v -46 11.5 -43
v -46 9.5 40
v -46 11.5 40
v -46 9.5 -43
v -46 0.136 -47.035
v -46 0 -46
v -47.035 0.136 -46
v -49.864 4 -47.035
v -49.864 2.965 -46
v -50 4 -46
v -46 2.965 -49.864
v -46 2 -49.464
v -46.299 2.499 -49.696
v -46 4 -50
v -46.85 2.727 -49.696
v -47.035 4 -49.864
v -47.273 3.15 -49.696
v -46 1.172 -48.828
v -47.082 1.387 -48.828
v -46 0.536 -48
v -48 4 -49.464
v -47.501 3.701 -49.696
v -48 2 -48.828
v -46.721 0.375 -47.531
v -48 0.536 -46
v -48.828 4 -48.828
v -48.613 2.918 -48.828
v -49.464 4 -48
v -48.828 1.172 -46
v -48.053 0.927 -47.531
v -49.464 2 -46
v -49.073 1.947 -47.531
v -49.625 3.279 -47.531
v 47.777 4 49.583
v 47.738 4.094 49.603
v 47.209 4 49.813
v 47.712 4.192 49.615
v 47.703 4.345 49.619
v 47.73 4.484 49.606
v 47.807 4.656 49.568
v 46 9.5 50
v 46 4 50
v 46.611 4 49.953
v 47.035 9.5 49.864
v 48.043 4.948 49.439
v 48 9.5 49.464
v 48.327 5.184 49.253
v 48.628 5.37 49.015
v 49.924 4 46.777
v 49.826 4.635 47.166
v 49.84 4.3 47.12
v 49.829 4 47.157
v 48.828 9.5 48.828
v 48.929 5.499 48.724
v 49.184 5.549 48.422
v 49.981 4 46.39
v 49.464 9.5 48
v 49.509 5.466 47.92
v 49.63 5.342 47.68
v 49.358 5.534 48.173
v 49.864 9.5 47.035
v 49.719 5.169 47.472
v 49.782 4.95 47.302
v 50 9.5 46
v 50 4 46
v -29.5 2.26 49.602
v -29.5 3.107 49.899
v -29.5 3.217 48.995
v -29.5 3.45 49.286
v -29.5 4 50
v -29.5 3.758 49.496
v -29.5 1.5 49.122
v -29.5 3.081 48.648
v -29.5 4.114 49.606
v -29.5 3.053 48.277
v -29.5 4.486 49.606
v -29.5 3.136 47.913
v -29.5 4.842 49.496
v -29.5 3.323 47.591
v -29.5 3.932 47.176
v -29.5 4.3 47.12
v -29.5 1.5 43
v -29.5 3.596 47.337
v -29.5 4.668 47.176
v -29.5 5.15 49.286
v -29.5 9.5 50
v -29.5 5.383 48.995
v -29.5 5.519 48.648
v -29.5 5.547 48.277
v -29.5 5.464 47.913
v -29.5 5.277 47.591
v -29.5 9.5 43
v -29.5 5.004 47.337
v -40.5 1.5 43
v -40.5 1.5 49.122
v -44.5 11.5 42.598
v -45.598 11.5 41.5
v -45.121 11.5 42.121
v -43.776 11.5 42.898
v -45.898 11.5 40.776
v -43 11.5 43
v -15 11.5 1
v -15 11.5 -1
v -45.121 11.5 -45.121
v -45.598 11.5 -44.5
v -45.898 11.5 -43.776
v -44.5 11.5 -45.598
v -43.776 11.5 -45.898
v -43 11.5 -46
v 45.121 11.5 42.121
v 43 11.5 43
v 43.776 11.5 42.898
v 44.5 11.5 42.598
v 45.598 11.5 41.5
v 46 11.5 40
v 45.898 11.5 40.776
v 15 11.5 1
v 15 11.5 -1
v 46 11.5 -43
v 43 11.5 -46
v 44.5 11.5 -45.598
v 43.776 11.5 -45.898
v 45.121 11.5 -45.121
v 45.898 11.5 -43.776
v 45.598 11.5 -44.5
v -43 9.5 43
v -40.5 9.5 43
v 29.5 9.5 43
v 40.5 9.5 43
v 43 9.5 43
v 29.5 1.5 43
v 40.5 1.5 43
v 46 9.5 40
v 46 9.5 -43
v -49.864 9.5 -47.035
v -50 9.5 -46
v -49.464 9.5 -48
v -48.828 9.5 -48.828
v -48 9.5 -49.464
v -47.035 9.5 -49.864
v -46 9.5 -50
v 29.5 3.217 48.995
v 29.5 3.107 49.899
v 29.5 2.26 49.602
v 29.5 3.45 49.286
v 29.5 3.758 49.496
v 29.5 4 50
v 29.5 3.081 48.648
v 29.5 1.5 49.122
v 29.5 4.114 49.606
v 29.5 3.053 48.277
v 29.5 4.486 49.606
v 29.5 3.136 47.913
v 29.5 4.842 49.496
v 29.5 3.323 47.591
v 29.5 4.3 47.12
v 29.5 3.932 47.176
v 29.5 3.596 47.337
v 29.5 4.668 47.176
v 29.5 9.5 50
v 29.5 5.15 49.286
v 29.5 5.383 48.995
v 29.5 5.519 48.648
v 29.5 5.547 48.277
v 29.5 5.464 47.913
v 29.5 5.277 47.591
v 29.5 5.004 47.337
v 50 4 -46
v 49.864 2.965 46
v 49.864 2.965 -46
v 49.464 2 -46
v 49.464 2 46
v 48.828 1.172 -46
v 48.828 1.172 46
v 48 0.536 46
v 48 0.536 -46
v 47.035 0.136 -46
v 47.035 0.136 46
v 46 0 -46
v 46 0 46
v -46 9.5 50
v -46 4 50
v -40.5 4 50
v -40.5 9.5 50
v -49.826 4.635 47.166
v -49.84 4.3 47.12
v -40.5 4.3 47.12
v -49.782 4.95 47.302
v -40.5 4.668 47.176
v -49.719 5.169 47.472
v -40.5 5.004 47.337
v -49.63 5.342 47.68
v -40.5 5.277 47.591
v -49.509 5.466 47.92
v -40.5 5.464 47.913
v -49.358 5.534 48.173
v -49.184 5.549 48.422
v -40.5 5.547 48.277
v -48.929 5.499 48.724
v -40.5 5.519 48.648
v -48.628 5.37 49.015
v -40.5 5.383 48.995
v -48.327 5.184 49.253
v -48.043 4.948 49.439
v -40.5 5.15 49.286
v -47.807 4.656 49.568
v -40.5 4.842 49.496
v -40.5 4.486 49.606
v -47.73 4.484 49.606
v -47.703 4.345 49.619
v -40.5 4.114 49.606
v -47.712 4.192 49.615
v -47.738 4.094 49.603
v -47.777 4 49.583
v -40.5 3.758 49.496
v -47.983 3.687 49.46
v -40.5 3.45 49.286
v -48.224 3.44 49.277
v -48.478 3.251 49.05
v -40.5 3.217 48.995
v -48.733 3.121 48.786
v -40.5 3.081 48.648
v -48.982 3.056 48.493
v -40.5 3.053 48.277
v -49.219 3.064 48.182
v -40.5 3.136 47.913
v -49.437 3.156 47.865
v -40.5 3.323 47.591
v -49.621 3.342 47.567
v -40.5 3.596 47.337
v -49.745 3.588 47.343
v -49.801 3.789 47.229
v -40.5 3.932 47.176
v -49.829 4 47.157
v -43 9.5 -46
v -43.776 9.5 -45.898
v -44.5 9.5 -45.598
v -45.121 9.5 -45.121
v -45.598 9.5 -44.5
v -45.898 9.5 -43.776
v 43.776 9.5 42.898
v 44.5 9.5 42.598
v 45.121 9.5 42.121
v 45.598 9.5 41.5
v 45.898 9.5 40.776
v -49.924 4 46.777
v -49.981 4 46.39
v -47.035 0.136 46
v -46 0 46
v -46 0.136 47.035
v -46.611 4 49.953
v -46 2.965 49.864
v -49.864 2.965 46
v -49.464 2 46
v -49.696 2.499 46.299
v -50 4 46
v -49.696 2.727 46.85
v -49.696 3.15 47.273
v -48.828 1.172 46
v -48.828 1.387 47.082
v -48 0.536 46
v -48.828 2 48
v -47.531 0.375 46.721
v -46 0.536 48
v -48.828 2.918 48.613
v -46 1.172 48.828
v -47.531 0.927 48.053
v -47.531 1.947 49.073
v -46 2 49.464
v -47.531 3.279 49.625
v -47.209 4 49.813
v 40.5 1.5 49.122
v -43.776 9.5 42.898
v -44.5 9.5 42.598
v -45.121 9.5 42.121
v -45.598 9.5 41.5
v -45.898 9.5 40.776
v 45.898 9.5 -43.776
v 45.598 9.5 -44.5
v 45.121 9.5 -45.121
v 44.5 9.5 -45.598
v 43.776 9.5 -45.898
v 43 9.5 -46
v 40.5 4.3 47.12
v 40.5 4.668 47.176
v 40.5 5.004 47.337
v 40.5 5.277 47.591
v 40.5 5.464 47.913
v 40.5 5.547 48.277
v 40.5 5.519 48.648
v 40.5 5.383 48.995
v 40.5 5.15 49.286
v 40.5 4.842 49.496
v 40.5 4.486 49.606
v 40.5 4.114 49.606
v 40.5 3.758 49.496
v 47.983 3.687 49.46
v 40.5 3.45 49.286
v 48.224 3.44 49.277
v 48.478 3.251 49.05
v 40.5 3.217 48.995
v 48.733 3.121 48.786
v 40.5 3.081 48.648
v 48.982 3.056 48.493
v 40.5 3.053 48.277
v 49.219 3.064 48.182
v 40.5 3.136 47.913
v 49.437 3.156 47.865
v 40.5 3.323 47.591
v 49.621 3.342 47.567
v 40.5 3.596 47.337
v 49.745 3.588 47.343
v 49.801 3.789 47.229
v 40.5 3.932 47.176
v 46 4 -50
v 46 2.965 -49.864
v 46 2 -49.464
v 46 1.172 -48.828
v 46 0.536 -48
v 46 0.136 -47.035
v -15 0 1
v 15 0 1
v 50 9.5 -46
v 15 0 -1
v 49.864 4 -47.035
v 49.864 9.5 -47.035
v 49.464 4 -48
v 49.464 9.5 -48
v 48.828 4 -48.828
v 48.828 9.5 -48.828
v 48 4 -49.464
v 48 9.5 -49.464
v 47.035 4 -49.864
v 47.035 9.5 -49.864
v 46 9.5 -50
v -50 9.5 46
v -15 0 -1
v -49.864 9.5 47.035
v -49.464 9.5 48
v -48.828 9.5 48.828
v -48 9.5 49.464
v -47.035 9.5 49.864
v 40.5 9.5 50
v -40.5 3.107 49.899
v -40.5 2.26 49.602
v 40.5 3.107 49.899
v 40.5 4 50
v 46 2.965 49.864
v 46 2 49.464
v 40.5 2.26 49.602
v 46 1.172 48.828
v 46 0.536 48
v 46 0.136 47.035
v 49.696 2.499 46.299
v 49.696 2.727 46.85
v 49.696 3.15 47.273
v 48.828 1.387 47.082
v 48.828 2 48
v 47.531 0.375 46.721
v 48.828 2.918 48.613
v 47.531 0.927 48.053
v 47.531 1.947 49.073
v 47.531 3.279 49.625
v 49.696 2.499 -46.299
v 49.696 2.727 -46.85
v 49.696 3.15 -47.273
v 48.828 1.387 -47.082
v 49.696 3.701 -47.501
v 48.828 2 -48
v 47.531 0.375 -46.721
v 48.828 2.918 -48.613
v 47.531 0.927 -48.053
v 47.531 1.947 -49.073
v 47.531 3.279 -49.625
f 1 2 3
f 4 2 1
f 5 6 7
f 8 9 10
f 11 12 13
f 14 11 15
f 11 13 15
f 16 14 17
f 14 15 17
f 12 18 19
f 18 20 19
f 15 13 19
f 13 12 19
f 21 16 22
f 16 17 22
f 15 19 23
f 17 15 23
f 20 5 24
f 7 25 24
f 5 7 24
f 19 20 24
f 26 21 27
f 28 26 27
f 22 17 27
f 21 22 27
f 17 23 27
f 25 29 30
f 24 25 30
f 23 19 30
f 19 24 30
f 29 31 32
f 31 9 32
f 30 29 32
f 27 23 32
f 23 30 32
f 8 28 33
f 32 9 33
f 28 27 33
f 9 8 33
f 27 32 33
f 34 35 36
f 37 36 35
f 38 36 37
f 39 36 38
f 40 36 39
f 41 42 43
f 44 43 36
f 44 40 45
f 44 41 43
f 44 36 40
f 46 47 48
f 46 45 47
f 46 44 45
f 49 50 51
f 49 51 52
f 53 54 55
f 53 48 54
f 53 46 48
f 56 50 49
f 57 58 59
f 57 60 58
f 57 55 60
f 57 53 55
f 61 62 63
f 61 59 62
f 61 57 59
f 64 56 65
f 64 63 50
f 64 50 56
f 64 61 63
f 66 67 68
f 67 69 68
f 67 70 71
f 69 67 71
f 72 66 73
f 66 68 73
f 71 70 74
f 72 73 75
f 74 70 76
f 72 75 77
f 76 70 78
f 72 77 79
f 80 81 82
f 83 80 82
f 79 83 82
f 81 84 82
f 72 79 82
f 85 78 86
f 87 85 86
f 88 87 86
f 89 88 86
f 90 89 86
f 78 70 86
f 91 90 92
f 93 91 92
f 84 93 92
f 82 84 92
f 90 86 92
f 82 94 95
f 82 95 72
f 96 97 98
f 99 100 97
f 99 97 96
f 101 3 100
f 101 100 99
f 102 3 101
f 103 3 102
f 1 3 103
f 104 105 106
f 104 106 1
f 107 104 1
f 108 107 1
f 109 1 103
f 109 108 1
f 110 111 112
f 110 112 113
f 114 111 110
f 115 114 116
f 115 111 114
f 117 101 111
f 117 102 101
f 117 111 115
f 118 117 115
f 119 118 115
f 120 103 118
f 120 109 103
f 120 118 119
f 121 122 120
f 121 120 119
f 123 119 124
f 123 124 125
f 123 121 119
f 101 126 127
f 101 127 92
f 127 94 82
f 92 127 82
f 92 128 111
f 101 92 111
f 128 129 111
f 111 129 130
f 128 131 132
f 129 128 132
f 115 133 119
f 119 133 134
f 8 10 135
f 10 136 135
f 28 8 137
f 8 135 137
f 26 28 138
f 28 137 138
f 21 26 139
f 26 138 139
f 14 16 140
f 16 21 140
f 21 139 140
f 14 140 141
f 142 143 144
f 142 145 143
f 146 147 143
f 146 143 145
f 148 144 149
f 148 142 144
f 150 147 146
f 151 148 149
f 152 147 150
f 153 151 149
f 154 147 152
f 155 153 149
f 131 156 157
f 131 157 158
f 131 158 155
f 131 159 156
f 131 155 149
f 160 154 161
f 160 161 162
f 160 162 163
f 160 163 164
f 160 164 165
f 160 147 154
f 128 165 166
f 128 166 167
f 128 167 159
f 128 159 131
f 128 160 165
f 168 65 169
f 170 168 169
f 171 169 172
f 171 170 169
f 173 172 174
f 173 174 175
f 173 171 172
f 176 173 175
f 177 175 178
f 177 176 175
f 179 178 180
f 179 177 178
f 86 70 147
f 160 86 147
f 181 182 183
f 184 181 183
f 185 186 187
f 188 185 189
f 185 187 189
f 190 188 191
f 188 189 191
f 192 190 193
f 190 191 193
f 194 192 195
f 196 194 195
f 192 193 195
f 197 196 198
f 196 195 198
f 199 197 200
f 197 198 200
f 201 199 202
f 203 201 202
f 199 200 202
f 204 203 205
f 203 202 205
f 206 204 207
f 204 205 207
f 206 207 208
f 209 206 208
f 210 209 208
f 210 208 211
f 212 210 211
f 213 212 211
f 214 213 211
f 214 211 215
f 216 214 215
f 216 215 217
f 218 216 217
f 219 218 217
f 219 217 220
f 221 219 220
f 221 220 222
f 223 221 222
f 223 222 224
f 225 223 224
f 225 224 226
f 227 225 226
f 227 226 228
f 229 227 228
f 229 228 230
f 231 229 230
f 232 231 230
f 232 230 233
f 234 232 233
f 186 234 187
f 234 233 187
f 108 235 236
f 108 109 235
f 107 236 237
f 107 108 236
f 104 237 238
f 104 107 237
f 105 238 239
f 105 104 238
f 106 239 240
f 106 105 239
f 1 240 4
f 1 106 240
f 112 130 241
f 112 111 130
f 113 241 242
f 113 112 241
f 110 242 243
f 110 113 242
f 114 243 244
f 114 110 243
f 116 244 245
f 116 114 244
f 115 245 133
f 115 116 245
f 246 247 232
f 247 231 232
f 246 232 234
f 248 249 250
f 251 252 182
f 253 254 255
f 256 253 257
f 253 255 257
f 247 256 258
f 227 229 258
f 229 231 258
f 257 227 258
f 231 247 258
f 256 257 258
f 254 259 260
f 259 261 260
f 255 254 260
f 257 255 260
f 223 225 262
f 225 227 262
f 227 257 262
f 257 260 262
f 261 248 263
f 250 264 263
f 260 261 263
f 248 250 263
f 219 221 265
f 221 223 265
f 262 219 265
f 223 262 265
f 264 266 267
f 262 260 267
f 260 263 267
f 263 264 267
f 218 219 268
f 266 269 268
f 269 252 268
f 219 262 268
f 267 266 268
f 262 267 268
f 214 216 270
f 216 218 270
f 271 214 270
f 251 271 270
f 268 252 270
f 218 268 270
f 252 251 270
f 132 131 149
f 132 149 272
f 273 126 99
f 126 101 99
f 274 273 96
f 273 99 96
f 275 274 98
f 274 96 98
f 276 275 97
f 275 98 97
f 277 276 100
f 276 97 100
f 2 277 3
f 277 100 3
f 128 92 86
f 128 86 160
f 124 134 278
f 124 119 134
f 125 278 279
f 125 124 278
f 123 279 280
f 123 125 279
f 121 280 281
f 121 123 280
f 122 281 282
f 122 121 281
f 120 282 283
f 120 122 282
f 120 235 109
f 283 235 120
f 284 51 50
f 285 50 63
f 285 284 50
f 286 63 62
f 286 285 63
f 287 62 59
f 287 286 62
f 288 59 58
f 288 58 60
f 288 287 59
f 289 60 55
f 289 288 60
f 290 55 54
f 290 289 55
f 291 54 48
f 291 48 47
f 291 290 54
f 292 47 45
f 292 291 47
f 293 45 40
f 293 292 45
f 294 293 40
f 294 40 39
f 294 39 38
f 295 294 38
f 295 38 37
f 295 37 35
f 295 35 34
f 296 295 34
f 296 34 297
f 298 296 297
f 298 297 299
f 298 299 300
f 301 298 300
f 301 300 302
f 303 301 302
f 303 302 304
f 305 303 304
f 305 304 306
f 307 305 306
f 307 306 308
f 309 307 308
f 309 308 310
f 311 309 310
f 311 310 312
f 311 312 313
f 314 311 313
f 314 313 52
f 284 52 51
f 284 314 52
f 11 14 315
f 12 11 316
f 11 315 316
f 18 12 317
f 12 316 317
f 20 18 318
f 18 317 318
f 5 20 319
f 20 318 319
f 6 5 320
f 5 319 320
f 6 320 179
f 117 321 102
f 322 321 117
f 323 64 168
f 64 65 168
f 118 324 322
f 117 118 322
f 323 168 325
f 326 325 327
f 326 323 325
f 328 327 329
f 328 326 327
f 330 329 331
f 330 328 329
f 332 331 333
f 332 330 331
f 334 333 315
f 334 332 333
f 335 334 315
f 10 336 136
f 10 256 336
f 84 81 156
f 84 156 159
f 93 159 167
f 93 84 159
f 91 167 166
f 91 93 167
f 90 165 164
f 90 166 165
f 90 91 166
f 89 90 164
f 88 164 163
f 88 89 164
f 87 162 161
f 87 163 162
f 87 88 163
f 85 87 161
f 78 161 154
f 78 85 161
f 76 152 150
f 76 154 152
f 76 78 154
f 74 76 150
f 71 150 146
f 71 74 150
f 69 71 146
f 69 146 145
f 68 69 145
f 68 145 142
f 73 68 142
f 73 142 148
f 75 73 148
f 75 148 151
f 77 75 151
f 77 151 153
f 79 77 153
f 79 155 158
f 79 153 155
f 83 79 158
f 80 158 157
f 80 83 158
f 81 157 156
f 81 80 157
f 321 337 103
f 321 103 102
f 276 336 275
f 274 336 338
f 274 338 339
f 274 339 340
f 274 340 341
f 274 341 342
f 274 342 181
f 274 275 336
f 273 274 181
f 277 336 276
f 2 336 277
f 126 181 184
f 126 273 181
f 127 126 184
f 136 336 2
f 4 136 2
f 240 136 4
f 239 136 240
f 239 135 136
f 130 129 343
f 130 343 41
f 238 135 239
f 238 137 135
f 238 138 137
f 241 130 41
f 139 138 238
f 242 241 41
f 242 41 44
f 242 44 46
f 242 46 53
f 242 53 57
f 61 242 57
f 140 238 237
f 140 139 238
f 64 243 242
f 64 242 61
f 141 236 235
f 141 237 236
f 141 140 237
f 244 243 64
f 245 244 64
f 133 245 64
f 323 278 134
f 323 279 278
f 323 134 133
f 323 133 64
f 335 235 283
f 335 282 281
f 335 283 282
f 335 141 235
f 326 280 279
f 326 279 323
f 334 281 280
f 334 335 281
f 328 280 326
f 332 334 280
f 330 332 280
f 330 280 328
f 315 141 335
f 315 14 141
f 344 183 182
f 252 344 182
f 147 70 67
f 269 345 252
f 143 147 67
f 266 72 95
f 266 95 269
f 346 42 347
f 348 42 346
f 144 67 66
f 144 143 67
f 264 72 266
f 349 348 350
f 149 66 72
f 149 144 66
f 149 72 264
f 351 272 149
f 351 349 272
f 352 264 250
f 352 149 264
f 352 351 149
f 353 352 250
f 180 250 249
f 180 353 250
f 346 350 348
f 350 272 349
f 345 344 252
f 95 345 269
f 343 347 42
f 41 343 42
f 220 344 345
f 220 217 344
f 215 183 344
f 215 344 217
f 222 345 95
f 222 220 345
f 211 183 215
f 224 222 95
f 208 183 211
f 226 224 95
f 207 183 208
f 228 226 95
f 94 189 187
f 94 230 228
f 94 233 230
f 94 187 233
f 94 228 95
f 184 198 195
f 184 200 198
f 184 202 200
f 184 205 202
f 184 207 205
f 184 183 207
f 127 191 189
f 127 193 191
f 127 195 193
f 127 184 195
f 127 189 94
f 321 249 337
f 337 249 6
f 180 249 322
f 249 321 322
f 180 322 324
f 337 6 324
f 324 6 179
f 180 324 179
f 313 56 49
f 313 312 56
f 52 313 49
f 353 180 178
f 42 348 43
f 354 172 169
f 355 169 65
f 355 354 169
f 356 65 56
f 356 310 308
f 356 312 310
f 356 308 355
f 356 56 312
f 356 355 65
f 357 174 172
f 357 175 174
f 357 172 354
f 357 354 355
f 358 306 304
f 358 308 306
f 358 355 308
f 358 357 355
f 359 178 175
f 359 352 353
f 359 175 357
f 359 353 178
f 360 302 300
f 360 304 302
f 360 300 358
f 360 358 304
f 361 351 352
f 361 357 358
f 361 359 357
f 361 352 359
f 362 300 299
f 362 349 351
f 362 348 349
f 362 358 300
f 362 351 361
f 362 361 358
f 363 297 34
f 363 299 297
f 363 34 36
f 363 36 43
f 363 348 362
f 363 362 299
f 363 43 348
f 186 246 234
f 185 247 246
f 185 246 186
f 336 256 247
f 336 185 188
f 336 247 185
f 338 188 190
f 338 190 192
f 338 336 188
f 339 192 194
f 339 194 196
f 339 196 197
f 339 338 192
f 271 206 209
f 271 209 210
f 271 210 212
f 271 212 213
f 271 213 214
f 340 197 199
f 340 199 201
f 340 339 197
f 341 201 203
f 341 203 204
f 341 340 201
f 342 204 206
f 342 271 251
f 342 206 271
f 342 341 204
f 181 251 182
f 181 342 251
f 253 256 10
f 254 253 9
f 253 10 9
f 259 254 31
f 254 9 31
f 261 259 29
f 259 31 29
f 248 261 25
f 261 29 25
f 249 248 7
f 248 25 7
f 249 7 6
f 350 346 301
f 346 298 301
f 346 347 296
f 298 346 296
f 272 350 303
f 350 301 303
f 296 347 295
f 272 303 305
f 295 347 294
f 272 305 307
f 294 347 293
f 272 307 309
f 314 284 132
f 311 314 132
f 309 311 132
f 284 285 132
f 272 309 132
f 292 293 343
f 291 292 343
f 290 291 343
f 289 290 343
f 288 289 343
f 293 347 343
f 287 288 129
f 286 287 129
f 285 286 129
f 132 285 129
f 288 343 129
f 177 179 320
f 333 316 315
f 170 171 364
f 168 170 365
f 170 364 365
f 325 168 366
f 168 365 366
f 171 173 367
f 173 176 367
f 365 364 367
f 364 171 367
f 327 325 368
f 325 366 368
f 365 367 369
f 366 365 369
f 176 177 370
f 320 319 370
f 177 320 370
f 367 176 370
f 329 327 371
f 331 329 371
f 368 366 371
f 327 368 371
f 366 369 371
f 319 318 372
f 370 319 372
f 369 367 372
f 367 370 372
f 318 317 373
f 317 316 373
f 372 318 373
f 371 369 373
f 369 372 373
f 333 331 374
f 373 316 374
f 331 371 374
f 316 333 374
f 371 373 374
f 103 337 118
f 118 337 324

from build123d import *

# Parameters (mm, degrees)
SKETCH_1_W               = 100
SKETCH_1_H               = 100
EXTRUDE_1_DEPTH          = 9.5
FILLET_1_R               = 4
SKETCH_3_W               = 92
SKETCH_3_H               = 89
EXTRUDE_2_DEPTH          = 2
FILLET_2_R               = 3
SKETCH_2_W               = 11
SKETCH_2_H               = 7
CUT_EXTRUDE_1_DEPTH      = 8
SKETCH_4_R               = 1.25
CUT_EXTRUDE_2_DEPTH      = 91.5
CUT_EXTRUDE_2_DEPTH_BACK = 10.5
SKETCH_5_W               = 30
SKETCH_5_H               = 2
CUT_EXTRUDE_3_DEPTH      = 12.5


with BuildPart() as part:
    # Эскиз1 → Бобышка-Вытянуть1 (new body)
    with BuildSketch(Plane(origin=(0, 0, 0), x_dir=(1, 0, 0), z_dir=(0, 1, 0))):
        Rectangle(SKETCH_1_W, SKETCH_1_H)
    extrude(amount=EXTRUDE_1_DEPTH)

    # Скругление1
    fillet_1_edges = [part.edges().sort_by_distance(p)[0] for p in [
        (0, 0, 50),
        (-50, 0, 0),
        (0, 0, -50),
        (50, 0, 0),
        (50, 4.75, 50),
        (-50, 4.75, 50),
        (-50, 4.75, -50),
        (50, 4.75, -50),
    ]]
    fillet(fillet_1_edges, radius=FILLET_1_R)

    # Эскиз3 → Бобышка-Вытянуть2 (add)
    with BuildSketch(Plane(origin=(0, 9.5, 0), x_dir=(1, 0, 0), z_dir=(0, 1, 0))):
        with Locations((0, 1.5)):
            Rectangle(SKETCH_3_W, SKETCH_3_H)
    extrude(amount=EXTRUDE_2_DEPTH)

    # Скругление2
    fillet_2_edges = [part.edges().sort_by_distance(p)[0] for p in [
        (46, 10.5, 43),
        (46, 10.5, -46),
        (-46, 10.5, -46),
        (-46, 10.5, 43),
    ]]
    fillet(fillet_2_edges, radius=FILLET_2_R)

    # Эскиз2 → Вырез-Вытянуть1 (cut)
    with BuildSketch(Plane(origin=(0, 9.5, 0), x_dir=(1, 0, 0), z_dir=(0, 1, 0))):
        with Locations((35, -46.5)):
            Rectangle(SKETCH_2_W, SKETCH_2_H)
        with Locations((-35, -46.5)):
            Rectangle(SKETCH_2_W, SKETCH_2_H)
    extrude(amount=-CUT_EXTRUDE_1_DEPTH, mode=Mode.SUBTRACT)

    # Эскиз4 → Вырез-Вытянуть2 (cut, two sides)
    with BuildSketch(Plane(origin=(-40.5, 0, 0), x_dir=(0, 0, -1), z_dir=(1, 0, 0))) as cut_extrude_2_sk:
        with Locations((-48.37, 4.3)):
            Circle(SKETCH_4_R)
    extrude(amount=CUT_EXTRUDE_2_DEPTH, mode=Mode.SUBTRACT)
    extrude(cut_extrude_2_sk.sketch, amount=-CUT_EXTRUDE_2_DEPTH_BACK, mode=Mode.SUBTRACT)

    # Эскиз5 → Вырез-Вытянуть3 (cut, through all)
    with BuildSketch(Plane.XZ):
        Rectangle(SKETCH_5_W, SKETCH_5_H)
    extrude(amount=-CUT_EXTRUDE_3_DEPTH, mode=Mode.SUBTRACT)


solid = part.part
